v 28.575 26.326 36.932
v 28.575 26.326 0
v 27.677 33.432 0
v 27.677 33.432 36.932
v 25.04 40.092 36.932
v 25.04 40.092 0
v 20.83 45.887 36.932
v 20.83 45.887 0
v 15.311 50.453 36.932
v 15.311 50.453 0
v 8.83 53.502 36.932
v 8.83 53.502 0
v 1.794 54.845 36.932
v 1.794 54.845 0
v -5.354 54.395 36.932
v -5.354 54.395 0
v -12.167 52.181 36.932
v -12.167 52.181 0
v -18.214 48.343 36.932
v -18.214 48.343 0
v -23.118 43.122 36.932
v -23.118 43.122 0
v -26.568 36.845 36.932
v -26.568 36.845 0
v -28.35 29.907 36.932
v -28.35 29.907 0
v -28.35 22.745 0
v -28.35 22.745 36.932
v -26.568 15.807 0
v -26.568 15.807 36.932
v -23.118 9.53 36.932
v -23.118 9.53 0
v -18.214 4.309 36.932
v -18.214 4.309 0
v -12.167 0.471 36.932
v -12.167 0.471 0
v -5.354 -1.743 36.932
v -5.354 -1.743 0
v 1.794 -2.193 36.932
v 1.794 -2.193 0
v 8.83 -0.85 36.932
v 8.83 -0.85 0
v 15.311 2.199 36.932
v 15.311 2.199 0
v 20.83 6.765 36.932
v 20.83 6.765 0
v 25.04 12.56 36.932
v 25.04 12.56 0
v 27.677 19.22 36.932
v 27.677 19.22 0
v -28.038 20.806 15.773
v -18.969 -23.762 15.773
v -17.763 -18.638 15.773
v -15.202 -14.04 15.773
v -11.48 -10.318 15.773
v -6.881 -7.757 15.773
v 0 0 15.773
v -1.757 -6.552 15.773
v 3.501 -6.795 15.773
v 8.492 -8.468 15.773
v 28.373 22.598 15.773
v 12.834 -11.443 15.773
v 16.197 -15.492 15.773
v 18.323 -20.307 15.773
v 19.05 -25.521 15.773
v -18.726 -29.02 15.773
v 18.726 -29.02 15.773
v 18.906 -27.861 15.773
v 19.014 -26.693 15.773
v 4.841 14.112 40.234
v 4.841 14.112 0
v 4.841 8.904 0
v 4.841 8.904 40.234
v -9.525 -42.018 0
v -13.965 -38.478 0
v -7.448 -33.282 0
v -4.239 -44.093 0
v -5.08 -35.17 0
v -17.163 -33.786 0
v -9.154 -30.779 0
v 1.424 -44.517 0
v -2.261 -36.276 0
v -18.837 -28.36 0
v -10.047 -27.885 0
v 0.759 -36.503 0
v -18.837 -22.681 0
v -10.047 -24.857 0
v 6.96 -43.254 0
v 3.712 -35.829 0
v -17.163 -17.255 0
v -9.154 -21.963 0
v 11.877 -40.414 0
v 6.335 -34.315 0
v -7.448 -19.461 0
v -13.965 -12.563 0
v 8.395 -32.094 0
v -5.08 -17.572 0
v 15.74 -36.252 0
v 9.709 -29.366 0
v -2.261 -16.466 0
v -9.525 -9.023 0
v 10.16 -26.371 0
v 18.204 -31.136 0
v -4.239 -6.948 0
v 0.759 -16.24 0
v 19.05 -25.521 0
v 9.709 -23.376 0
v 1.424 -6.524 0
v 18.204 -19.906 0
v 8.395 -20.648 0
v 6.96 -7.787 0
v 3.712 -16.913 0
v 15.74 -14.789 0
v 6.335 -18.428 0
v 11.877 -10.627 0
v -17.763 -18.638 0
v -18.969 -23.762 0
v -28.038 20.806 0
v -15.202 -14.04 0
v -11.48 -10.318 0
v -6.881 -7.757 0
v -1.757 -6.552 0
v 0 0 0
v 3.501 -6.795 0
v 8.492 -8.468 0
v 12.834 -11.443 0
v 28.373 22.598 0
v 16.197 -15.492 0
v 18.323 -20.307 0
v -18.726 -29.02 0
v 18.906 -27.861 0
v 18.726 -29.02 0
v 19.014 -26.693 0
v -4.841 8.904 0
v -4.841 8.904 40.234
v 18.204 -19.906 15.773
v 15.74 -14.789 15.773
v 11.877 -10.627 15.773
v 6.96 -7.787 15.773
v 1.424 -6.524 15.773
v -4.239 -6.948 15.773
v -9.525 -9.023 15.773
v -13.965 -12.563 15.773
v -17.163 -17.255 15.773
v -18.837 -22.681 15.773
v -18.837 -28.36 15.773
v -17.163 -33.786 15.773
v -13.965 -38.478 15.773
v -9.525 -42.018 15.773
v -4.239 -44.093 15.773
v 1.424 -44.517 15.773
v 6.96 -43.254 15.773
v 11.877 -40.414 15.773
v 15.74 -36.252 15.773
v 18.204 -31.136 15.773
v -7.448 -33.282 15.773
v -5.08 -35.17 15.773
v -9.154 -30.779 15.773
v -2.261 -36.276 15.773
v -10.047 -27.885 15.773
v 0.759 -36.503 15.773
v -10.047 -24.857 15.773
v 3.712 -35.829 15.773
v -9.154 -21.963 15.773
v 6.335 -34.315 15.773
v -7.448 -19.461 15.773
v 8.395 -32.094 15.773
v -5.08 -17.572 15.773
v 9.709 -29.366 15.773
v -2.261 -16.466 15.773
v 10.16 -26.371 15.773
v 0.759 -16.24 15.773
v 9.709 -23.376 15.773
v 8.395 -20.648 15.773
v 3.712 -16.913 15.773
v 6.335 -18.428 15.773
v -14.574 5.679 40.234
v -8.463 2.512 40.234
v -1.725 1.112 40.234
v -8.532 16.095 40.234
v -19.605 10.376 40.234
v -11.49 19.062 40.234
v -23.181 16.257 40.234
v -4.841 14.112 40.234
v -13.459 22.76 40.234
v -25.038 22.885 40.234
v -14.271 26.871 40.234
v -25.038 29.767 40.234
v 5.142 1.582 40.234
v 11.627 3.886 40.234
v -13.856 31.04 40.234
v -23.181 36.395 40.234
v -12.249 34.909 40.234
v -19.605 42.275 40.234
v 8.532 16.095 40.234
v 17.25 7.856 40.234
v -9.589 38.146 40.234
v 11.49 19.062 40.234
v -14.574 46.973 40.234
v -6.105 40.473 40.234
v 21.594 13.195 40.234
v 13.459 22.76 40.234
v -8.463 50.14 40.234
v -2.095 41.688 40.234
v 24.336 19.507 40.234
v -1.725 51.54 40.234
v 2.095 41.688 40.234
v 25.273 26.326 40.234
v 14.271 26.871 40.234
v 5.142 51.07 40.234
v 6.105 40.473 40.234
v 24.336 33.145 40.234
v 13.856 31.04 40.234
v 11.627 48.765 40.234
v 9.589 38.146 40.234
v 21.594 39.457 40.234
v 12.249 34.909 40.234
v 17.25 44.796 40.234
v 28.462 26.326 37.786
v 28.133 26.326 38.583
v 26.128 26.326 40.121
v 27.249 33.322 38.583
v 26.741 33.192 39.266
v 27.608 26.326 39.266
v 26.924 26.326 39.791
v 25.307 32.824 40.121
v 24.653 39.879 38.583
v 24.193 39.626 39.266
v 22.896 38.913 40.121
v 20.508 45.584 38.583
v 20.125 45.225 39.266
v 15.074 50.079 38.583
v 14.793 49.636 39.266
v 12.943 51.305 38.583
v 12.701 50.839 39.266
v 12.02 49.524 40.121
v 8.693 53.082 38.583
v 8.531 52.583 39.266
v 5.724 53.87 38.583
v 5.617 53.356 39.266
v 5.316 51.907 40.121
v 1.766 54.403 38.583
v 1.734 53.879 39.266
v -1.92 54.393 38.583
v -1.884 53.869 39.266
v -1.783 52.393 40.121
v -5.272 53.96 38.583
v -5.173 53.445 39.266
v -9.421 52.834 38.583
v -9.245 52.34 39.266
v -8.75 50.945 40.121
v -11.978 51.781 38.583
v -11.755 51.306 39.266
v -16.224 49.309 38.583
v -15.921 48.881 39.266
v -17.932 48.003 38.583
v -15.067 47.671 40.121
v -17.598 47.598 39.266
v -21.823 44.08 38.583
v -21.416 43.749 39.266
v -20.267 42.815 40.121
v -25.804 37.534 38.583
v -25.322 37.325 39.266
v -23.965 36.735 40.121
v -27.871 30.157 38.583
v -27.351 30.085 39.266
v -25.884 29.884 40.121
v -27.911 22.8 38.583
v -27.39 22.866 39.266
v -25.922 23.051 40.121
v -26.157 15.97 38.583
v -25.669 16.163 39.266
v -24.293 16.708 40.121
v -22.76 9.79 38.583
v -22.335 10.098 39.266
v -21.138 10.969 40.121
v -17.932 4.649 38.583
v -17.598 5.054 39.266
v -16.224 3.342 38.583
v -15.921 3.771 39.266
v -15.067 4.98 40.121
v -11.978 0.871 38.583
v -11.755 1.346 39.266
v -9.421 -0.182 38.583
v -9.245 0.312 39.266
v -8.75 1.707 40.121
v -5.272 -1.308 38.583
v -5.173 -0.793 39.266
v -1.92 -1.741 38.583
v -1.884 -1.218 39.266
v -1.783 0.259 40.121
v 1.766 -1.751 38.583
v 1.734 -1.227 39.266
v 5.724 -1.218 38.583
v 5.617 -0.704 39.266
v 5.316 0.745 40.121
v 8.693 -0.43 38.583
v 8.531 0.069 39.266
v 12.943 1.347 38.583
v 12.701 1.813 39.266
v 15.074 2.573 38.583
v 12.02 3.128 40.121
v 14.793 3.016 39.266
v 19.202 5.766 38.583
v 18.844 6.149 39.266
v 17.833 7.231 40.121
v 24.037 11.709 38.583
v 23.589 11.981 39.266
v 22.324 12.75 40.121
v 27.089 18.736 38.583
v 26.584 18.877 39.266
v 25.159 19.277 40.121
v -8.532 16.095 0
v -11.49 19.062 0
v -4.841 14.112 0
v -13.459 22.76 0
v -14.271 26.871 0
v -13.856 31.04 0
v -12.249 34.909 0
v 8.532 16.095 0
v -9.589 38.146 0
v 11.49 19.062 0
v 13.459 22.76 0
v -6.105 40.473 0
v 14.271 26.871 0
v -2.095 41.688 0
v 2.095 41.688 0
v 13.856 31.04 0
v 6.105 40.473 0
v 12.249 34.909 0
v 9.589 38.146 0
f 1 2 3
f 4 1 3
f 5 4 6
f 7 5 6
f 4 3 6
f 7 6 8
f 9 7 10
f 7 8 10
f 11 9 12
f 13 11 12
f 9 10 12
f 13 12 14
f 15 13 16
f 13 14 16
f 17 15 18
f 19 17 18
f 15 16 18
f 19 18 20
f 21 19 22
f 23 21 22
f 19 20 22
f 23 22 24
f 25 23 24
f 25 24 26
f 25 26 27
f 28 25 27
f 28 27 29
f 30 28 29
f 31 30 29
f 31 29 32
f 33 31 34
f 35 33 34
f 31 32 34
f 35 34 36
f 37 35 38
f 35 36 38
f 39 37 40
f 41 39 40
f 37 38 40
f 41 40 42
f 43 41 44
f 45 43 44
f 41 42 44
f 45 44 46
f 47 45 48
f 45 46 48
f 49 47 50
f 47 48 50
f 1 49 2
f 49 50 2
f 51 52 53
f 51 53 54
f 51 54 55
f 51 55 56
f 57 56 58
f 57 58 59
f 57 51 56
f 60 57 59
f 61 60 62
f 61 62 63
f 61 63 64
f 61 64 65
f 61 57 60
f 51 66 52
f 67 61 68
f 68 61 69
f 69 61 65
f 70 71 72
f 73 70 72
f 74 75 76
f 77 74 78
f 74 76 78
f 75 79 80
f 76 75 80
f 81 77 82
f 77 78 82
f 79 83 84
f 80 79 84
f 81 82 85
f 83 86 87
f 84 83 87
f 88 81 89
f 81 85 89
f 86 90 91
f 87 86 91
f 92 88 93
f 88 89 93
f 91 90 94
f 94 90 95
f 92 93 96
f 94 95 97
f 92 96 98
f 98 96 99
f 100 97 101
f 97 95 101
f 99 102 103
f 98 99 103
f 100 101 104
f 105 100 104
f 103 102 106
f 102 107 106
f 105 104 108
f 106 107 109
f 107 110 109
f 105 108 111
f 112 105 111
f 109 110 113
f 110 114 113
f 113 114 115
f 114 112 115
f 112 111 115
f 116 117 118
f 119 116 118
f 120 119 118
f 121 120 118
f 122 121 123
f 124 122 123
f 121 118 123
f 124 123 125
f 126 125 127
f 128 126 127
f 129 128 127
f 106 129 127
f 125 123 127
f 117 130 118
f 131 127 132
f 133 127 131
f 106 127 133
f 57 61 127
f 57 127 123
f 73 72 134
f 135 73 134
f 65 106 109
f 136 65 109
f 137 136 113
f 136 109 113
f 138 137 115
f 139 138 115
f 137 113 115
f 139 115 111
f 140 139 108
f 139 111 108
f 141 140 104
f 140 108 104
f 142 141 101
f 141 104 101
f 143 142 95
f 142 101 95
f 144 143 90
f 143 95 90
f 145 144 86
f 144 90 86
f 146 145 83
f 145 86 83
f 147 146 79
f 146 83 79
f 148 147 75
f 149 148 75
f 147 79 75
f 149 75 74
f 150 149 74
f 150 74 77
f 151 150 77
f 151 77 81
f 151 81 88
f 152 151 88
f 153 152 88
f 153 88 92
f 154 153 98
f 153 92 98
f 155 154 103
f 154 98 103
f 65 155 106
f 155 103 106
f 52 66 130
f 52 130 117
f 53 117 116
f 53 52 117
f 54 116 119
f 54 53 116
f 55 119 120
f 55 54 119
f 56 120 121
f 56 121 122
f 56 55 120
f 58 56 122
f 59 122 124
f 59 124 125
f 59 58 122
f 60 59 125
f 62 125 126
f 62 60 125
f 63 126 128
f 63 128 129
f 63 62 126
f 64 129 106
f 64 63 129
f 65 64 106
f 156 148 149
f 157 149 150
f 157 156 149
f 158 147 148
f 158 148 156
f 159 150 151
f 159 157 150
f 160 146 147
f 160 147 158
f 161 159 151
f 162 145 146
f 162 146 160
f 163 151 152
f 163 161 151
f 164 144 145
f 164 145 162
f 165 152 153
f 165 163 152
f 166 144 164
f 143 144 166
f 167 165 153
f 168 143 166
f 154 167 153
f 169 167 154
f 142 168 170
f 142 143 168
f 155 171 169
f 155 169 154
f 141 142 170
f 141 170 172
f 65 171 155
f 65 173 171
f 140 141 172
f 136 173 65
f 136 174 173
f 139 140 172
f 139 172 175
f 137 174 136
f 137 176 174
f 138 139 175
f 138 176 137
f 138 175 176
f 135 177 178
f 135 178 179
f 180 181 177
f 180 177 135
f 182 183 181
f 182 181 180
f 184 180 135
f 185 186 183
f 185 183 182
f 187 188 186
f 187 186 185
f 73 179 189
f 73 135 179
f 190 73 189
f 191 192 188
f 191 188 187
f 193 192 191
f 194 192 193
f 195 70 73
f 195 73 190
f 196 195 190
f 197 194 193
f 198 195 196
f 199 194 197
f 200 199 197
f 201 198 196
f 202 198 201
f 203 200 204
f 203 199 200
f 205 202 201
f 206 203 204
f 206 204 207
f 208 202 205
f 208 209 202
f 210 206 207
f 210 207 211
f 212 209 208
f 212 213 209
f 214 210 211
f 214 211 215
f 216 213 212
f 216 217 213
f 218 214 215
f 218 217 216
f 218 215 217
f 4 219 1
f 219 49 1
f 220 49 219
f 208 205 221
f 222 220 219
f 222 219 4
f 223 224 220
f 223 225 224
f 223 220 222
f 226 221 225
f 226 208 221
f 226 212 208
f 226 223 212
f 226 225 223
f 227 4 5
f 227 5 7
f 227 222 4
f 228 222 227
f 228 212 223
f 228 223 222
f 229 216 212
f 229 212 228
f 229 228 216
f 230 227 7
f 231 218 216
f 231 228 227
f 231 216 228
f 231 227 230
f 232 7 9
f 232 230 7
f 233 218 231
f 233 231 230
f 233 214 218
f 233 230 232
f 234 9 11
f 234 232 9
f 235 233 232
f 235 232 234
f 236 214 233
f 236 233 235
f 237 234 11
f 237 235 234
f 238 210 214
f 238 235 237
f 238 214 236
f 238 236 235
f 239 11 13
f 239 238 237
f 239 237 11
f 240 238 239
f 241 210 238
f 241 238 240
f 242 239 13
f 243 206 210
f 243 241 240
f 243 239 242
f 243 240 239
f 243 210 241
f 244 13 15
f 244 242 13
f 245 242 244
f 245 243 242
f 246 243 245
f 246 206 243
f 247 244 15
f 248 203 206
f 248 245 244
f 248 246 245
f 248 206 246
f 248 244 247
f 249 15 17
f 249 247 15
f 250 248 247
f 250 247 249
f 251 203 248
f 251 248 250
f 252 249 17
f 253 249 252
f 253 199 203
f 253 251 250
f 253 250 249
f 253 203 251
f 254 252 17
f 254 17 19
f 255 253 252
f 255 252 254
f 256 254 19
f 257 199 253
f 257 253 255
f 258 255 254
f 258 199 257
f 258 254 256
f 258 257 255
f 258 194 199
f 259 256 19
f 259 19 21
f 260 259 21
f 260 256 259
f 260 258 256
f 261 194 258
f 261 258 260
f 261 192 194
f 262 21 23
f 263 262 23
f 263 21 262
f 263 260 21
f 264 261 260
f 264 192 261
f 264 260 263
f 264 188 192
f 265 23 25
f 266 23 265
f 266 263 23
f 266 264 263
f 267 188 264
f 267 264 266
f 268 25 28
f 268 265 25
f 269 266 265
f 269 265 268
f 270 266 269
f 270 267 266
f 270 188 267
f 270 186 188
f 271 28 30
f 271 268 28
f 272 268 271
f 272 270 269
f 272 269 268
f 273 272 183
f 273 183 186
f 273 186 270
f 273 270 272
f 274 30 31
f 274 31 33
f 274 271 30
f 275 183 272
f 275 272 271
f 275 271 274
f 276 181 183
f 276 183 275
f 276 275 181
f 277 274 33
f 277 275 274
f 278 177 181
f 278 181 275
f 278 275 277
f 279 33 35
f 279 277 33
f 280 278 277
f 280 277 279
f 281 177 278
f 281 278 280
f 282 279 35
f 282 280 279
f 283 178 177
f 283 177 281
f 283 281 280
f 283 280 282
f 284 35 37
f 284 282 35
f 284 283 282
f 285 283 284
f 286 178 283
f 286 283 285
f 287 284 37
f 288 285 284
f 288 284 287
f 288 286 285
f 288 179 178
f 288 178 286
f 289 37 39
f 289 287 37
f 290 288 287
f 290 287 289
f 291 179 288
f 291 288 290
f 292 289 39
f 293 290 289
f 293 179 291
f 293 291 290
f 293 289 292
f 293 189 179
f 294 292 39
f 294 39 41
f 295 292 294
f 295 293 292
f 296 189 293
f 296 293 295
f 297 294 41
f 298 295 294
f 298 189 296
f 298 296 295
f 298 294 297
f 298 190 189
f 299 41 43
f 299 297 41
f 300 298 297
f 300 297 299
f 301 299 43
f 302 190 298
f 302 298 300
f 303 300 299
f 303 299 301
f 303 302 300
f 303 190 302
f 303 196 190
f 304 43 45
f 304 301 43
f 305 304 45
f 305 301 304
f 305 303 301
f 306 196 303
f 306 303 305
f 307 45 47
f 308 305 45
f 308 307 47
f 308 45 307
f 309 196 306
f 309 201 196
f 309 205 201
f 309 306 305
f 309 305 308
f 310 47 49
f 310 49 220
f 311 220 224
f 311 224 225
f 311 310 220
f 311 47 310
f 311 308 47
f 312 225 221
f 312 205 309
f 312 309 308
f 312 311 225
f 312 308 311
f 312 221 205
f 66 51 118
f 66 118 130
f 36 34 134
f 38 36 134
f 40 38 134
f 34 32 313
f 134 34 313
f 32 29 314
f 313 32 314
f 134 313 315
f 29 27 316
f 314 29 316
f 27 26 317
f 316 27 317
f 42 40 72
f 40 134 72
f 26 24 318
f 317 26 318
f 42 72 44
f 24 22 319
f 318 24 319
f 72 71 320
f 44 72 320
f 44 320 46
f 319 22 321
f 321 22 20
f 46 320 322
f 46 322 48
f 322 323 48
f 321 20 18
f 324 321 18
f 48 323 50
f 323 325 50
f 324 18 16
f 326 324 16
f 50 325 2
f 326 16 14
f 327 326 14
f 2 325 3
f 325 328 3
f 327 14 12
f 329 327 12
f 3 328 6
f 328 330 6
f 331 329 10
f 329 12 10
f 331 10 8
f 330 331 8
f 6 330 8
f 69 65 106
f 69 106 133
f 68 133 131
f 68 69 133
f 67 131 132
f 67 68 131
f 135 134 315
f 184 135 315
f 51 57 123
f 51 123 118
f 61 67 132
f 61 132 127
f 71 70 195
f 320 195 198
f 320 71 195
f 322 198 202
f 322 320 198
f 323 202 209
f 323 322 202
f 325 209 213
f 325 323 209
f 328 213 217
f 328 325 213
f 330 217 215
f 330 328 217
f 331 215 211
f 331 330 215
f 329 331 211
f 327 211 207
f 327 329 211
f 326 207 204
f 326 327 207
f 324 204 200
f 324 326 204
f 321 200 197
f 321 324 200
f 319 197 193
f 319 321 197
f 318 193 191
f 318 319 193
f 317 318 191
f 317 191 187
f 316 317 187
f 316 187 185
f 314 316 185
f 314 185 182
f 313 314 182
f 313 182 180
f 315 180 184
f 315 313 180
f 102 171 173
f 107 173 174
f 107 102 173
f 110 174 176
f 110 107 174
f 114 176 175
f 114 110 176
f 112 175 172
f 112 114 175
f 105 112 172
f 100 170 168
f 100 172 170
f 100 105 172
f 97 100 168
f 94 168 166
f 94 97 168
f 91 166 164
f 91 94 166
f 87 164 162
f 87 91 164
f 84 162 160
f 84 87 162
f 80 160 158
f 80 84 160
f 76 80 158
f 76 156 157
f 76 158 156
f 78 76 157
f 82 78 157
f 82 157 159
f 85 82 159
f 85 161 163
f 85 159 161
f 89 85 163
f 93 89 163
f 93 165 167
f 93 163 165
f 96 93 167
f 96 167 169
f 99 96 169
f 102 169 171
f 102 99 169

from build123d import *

# Parameters (mm, degrees)
F3_R      = 28.575
F4_DEPTH  = 40.2336
F2_R      = 19.05
F5_DEPTH  = 15.7734
F1_R      = 14.2875
F6_DEPTH  = 63.754
F0_R      = 10.16
F8_DEPTH  = 111.506
F9_R      = 3.302
F11_DEPTH = 15.7734
F12_DEPTH = 175.514


with BuildPart() as f4:
    # F3 (on Top) → F4 (new body)
    with BuildSketch(Plane.XY):
        with Locations((0, 26.3259668327)):
            Circle(F3_R)
    extrude(amount=F4_DEPTH)

    # F1 (on Top) → F6 (cut)
    with BuildSketch(Plane.XY):
        with Locations((0, 27.5547930962)):
            Circle(F1_R)
    extrude(amount=F6_DEPTH, mode=Mode.SUBTRACT)

    # F9
    f9_edges = [f4.edges().sort_by_distance(p)[0] for p in [
        (-28.575, 26.325967, 40.2336),
    ]]
    fillet(f9_edges, radius=F9_R)

    # F7 (on face) → F12 (cut)
    with BuildSketch(Plane(origin=(0, 0, 0), x_dir=(1, 0, 0), z_dir=(0, 0, -1))):
        with BuildLine():
            Line((4.8409085721, -8.9035527781), (-4.8409085721, -8.9035527781))
            Line((-4.8409085721, -8.9035527781), (-4.8409085721, -14.1123877889))
            ThreePointArc((-4.8409085721, -14.1123877889), (0, -13.2672930962), (4.8409085721, -14.1123877889))
            Line((4.8409085721, -14.1123877889), (4.8409085721, -8.9035527781))
        make_face()
    extrude(amount=-F12_DEPTH, mode=Mode.SUBTRACT)


with BuildPart() as f5:
    # F2 (on Top) → F5 (new body)
    with BuildSketch(Plane.XY):
        with Locations((0, -25.5206029374)):
            Circle(F2_R)
    extrude(amount=F5_DEPTH)

    # F0 (on Top) → F8 (cut)
    with BuildSketch(Plane.XY):
        with Locations((0, -26.3711268374)):
            Circle(F0_R)
    extrude(amount=F8_DEPTH, mode=Mode.SUBTRACT)


with BuildPart() as f11:
    # F10 (on face) → F11 (new body)
    with BuildSketch(Plane.XY.offset(15.7734)):
        with BuildLine():
            Line((-28.0381266038, 20.8060319091), (-18.7257599466, -29.0203764192))
            ThreePointArc((-18.7257599466, -29.0203764192), (-1.7573805817, -6.5518361485), (19.05, -25.5206029374))
            ThreePointArc((19.05, -25.5206029374), (18.9687667889, -27.2779835191), (18.7257599466, -29.0203764192))
            Line((18.7257599466, -29.0203764192), (28.3731155461, 22.598411488))
            Line((28.3731155461, 22.598411488), (0, 0))
            Line((0, 0), (-28.0381266038, 20.8060319091))
        make_face()
    extrude(amount=-F11_DEPTH)


solid = Compound([f4.part, f5.part, f11.part])
